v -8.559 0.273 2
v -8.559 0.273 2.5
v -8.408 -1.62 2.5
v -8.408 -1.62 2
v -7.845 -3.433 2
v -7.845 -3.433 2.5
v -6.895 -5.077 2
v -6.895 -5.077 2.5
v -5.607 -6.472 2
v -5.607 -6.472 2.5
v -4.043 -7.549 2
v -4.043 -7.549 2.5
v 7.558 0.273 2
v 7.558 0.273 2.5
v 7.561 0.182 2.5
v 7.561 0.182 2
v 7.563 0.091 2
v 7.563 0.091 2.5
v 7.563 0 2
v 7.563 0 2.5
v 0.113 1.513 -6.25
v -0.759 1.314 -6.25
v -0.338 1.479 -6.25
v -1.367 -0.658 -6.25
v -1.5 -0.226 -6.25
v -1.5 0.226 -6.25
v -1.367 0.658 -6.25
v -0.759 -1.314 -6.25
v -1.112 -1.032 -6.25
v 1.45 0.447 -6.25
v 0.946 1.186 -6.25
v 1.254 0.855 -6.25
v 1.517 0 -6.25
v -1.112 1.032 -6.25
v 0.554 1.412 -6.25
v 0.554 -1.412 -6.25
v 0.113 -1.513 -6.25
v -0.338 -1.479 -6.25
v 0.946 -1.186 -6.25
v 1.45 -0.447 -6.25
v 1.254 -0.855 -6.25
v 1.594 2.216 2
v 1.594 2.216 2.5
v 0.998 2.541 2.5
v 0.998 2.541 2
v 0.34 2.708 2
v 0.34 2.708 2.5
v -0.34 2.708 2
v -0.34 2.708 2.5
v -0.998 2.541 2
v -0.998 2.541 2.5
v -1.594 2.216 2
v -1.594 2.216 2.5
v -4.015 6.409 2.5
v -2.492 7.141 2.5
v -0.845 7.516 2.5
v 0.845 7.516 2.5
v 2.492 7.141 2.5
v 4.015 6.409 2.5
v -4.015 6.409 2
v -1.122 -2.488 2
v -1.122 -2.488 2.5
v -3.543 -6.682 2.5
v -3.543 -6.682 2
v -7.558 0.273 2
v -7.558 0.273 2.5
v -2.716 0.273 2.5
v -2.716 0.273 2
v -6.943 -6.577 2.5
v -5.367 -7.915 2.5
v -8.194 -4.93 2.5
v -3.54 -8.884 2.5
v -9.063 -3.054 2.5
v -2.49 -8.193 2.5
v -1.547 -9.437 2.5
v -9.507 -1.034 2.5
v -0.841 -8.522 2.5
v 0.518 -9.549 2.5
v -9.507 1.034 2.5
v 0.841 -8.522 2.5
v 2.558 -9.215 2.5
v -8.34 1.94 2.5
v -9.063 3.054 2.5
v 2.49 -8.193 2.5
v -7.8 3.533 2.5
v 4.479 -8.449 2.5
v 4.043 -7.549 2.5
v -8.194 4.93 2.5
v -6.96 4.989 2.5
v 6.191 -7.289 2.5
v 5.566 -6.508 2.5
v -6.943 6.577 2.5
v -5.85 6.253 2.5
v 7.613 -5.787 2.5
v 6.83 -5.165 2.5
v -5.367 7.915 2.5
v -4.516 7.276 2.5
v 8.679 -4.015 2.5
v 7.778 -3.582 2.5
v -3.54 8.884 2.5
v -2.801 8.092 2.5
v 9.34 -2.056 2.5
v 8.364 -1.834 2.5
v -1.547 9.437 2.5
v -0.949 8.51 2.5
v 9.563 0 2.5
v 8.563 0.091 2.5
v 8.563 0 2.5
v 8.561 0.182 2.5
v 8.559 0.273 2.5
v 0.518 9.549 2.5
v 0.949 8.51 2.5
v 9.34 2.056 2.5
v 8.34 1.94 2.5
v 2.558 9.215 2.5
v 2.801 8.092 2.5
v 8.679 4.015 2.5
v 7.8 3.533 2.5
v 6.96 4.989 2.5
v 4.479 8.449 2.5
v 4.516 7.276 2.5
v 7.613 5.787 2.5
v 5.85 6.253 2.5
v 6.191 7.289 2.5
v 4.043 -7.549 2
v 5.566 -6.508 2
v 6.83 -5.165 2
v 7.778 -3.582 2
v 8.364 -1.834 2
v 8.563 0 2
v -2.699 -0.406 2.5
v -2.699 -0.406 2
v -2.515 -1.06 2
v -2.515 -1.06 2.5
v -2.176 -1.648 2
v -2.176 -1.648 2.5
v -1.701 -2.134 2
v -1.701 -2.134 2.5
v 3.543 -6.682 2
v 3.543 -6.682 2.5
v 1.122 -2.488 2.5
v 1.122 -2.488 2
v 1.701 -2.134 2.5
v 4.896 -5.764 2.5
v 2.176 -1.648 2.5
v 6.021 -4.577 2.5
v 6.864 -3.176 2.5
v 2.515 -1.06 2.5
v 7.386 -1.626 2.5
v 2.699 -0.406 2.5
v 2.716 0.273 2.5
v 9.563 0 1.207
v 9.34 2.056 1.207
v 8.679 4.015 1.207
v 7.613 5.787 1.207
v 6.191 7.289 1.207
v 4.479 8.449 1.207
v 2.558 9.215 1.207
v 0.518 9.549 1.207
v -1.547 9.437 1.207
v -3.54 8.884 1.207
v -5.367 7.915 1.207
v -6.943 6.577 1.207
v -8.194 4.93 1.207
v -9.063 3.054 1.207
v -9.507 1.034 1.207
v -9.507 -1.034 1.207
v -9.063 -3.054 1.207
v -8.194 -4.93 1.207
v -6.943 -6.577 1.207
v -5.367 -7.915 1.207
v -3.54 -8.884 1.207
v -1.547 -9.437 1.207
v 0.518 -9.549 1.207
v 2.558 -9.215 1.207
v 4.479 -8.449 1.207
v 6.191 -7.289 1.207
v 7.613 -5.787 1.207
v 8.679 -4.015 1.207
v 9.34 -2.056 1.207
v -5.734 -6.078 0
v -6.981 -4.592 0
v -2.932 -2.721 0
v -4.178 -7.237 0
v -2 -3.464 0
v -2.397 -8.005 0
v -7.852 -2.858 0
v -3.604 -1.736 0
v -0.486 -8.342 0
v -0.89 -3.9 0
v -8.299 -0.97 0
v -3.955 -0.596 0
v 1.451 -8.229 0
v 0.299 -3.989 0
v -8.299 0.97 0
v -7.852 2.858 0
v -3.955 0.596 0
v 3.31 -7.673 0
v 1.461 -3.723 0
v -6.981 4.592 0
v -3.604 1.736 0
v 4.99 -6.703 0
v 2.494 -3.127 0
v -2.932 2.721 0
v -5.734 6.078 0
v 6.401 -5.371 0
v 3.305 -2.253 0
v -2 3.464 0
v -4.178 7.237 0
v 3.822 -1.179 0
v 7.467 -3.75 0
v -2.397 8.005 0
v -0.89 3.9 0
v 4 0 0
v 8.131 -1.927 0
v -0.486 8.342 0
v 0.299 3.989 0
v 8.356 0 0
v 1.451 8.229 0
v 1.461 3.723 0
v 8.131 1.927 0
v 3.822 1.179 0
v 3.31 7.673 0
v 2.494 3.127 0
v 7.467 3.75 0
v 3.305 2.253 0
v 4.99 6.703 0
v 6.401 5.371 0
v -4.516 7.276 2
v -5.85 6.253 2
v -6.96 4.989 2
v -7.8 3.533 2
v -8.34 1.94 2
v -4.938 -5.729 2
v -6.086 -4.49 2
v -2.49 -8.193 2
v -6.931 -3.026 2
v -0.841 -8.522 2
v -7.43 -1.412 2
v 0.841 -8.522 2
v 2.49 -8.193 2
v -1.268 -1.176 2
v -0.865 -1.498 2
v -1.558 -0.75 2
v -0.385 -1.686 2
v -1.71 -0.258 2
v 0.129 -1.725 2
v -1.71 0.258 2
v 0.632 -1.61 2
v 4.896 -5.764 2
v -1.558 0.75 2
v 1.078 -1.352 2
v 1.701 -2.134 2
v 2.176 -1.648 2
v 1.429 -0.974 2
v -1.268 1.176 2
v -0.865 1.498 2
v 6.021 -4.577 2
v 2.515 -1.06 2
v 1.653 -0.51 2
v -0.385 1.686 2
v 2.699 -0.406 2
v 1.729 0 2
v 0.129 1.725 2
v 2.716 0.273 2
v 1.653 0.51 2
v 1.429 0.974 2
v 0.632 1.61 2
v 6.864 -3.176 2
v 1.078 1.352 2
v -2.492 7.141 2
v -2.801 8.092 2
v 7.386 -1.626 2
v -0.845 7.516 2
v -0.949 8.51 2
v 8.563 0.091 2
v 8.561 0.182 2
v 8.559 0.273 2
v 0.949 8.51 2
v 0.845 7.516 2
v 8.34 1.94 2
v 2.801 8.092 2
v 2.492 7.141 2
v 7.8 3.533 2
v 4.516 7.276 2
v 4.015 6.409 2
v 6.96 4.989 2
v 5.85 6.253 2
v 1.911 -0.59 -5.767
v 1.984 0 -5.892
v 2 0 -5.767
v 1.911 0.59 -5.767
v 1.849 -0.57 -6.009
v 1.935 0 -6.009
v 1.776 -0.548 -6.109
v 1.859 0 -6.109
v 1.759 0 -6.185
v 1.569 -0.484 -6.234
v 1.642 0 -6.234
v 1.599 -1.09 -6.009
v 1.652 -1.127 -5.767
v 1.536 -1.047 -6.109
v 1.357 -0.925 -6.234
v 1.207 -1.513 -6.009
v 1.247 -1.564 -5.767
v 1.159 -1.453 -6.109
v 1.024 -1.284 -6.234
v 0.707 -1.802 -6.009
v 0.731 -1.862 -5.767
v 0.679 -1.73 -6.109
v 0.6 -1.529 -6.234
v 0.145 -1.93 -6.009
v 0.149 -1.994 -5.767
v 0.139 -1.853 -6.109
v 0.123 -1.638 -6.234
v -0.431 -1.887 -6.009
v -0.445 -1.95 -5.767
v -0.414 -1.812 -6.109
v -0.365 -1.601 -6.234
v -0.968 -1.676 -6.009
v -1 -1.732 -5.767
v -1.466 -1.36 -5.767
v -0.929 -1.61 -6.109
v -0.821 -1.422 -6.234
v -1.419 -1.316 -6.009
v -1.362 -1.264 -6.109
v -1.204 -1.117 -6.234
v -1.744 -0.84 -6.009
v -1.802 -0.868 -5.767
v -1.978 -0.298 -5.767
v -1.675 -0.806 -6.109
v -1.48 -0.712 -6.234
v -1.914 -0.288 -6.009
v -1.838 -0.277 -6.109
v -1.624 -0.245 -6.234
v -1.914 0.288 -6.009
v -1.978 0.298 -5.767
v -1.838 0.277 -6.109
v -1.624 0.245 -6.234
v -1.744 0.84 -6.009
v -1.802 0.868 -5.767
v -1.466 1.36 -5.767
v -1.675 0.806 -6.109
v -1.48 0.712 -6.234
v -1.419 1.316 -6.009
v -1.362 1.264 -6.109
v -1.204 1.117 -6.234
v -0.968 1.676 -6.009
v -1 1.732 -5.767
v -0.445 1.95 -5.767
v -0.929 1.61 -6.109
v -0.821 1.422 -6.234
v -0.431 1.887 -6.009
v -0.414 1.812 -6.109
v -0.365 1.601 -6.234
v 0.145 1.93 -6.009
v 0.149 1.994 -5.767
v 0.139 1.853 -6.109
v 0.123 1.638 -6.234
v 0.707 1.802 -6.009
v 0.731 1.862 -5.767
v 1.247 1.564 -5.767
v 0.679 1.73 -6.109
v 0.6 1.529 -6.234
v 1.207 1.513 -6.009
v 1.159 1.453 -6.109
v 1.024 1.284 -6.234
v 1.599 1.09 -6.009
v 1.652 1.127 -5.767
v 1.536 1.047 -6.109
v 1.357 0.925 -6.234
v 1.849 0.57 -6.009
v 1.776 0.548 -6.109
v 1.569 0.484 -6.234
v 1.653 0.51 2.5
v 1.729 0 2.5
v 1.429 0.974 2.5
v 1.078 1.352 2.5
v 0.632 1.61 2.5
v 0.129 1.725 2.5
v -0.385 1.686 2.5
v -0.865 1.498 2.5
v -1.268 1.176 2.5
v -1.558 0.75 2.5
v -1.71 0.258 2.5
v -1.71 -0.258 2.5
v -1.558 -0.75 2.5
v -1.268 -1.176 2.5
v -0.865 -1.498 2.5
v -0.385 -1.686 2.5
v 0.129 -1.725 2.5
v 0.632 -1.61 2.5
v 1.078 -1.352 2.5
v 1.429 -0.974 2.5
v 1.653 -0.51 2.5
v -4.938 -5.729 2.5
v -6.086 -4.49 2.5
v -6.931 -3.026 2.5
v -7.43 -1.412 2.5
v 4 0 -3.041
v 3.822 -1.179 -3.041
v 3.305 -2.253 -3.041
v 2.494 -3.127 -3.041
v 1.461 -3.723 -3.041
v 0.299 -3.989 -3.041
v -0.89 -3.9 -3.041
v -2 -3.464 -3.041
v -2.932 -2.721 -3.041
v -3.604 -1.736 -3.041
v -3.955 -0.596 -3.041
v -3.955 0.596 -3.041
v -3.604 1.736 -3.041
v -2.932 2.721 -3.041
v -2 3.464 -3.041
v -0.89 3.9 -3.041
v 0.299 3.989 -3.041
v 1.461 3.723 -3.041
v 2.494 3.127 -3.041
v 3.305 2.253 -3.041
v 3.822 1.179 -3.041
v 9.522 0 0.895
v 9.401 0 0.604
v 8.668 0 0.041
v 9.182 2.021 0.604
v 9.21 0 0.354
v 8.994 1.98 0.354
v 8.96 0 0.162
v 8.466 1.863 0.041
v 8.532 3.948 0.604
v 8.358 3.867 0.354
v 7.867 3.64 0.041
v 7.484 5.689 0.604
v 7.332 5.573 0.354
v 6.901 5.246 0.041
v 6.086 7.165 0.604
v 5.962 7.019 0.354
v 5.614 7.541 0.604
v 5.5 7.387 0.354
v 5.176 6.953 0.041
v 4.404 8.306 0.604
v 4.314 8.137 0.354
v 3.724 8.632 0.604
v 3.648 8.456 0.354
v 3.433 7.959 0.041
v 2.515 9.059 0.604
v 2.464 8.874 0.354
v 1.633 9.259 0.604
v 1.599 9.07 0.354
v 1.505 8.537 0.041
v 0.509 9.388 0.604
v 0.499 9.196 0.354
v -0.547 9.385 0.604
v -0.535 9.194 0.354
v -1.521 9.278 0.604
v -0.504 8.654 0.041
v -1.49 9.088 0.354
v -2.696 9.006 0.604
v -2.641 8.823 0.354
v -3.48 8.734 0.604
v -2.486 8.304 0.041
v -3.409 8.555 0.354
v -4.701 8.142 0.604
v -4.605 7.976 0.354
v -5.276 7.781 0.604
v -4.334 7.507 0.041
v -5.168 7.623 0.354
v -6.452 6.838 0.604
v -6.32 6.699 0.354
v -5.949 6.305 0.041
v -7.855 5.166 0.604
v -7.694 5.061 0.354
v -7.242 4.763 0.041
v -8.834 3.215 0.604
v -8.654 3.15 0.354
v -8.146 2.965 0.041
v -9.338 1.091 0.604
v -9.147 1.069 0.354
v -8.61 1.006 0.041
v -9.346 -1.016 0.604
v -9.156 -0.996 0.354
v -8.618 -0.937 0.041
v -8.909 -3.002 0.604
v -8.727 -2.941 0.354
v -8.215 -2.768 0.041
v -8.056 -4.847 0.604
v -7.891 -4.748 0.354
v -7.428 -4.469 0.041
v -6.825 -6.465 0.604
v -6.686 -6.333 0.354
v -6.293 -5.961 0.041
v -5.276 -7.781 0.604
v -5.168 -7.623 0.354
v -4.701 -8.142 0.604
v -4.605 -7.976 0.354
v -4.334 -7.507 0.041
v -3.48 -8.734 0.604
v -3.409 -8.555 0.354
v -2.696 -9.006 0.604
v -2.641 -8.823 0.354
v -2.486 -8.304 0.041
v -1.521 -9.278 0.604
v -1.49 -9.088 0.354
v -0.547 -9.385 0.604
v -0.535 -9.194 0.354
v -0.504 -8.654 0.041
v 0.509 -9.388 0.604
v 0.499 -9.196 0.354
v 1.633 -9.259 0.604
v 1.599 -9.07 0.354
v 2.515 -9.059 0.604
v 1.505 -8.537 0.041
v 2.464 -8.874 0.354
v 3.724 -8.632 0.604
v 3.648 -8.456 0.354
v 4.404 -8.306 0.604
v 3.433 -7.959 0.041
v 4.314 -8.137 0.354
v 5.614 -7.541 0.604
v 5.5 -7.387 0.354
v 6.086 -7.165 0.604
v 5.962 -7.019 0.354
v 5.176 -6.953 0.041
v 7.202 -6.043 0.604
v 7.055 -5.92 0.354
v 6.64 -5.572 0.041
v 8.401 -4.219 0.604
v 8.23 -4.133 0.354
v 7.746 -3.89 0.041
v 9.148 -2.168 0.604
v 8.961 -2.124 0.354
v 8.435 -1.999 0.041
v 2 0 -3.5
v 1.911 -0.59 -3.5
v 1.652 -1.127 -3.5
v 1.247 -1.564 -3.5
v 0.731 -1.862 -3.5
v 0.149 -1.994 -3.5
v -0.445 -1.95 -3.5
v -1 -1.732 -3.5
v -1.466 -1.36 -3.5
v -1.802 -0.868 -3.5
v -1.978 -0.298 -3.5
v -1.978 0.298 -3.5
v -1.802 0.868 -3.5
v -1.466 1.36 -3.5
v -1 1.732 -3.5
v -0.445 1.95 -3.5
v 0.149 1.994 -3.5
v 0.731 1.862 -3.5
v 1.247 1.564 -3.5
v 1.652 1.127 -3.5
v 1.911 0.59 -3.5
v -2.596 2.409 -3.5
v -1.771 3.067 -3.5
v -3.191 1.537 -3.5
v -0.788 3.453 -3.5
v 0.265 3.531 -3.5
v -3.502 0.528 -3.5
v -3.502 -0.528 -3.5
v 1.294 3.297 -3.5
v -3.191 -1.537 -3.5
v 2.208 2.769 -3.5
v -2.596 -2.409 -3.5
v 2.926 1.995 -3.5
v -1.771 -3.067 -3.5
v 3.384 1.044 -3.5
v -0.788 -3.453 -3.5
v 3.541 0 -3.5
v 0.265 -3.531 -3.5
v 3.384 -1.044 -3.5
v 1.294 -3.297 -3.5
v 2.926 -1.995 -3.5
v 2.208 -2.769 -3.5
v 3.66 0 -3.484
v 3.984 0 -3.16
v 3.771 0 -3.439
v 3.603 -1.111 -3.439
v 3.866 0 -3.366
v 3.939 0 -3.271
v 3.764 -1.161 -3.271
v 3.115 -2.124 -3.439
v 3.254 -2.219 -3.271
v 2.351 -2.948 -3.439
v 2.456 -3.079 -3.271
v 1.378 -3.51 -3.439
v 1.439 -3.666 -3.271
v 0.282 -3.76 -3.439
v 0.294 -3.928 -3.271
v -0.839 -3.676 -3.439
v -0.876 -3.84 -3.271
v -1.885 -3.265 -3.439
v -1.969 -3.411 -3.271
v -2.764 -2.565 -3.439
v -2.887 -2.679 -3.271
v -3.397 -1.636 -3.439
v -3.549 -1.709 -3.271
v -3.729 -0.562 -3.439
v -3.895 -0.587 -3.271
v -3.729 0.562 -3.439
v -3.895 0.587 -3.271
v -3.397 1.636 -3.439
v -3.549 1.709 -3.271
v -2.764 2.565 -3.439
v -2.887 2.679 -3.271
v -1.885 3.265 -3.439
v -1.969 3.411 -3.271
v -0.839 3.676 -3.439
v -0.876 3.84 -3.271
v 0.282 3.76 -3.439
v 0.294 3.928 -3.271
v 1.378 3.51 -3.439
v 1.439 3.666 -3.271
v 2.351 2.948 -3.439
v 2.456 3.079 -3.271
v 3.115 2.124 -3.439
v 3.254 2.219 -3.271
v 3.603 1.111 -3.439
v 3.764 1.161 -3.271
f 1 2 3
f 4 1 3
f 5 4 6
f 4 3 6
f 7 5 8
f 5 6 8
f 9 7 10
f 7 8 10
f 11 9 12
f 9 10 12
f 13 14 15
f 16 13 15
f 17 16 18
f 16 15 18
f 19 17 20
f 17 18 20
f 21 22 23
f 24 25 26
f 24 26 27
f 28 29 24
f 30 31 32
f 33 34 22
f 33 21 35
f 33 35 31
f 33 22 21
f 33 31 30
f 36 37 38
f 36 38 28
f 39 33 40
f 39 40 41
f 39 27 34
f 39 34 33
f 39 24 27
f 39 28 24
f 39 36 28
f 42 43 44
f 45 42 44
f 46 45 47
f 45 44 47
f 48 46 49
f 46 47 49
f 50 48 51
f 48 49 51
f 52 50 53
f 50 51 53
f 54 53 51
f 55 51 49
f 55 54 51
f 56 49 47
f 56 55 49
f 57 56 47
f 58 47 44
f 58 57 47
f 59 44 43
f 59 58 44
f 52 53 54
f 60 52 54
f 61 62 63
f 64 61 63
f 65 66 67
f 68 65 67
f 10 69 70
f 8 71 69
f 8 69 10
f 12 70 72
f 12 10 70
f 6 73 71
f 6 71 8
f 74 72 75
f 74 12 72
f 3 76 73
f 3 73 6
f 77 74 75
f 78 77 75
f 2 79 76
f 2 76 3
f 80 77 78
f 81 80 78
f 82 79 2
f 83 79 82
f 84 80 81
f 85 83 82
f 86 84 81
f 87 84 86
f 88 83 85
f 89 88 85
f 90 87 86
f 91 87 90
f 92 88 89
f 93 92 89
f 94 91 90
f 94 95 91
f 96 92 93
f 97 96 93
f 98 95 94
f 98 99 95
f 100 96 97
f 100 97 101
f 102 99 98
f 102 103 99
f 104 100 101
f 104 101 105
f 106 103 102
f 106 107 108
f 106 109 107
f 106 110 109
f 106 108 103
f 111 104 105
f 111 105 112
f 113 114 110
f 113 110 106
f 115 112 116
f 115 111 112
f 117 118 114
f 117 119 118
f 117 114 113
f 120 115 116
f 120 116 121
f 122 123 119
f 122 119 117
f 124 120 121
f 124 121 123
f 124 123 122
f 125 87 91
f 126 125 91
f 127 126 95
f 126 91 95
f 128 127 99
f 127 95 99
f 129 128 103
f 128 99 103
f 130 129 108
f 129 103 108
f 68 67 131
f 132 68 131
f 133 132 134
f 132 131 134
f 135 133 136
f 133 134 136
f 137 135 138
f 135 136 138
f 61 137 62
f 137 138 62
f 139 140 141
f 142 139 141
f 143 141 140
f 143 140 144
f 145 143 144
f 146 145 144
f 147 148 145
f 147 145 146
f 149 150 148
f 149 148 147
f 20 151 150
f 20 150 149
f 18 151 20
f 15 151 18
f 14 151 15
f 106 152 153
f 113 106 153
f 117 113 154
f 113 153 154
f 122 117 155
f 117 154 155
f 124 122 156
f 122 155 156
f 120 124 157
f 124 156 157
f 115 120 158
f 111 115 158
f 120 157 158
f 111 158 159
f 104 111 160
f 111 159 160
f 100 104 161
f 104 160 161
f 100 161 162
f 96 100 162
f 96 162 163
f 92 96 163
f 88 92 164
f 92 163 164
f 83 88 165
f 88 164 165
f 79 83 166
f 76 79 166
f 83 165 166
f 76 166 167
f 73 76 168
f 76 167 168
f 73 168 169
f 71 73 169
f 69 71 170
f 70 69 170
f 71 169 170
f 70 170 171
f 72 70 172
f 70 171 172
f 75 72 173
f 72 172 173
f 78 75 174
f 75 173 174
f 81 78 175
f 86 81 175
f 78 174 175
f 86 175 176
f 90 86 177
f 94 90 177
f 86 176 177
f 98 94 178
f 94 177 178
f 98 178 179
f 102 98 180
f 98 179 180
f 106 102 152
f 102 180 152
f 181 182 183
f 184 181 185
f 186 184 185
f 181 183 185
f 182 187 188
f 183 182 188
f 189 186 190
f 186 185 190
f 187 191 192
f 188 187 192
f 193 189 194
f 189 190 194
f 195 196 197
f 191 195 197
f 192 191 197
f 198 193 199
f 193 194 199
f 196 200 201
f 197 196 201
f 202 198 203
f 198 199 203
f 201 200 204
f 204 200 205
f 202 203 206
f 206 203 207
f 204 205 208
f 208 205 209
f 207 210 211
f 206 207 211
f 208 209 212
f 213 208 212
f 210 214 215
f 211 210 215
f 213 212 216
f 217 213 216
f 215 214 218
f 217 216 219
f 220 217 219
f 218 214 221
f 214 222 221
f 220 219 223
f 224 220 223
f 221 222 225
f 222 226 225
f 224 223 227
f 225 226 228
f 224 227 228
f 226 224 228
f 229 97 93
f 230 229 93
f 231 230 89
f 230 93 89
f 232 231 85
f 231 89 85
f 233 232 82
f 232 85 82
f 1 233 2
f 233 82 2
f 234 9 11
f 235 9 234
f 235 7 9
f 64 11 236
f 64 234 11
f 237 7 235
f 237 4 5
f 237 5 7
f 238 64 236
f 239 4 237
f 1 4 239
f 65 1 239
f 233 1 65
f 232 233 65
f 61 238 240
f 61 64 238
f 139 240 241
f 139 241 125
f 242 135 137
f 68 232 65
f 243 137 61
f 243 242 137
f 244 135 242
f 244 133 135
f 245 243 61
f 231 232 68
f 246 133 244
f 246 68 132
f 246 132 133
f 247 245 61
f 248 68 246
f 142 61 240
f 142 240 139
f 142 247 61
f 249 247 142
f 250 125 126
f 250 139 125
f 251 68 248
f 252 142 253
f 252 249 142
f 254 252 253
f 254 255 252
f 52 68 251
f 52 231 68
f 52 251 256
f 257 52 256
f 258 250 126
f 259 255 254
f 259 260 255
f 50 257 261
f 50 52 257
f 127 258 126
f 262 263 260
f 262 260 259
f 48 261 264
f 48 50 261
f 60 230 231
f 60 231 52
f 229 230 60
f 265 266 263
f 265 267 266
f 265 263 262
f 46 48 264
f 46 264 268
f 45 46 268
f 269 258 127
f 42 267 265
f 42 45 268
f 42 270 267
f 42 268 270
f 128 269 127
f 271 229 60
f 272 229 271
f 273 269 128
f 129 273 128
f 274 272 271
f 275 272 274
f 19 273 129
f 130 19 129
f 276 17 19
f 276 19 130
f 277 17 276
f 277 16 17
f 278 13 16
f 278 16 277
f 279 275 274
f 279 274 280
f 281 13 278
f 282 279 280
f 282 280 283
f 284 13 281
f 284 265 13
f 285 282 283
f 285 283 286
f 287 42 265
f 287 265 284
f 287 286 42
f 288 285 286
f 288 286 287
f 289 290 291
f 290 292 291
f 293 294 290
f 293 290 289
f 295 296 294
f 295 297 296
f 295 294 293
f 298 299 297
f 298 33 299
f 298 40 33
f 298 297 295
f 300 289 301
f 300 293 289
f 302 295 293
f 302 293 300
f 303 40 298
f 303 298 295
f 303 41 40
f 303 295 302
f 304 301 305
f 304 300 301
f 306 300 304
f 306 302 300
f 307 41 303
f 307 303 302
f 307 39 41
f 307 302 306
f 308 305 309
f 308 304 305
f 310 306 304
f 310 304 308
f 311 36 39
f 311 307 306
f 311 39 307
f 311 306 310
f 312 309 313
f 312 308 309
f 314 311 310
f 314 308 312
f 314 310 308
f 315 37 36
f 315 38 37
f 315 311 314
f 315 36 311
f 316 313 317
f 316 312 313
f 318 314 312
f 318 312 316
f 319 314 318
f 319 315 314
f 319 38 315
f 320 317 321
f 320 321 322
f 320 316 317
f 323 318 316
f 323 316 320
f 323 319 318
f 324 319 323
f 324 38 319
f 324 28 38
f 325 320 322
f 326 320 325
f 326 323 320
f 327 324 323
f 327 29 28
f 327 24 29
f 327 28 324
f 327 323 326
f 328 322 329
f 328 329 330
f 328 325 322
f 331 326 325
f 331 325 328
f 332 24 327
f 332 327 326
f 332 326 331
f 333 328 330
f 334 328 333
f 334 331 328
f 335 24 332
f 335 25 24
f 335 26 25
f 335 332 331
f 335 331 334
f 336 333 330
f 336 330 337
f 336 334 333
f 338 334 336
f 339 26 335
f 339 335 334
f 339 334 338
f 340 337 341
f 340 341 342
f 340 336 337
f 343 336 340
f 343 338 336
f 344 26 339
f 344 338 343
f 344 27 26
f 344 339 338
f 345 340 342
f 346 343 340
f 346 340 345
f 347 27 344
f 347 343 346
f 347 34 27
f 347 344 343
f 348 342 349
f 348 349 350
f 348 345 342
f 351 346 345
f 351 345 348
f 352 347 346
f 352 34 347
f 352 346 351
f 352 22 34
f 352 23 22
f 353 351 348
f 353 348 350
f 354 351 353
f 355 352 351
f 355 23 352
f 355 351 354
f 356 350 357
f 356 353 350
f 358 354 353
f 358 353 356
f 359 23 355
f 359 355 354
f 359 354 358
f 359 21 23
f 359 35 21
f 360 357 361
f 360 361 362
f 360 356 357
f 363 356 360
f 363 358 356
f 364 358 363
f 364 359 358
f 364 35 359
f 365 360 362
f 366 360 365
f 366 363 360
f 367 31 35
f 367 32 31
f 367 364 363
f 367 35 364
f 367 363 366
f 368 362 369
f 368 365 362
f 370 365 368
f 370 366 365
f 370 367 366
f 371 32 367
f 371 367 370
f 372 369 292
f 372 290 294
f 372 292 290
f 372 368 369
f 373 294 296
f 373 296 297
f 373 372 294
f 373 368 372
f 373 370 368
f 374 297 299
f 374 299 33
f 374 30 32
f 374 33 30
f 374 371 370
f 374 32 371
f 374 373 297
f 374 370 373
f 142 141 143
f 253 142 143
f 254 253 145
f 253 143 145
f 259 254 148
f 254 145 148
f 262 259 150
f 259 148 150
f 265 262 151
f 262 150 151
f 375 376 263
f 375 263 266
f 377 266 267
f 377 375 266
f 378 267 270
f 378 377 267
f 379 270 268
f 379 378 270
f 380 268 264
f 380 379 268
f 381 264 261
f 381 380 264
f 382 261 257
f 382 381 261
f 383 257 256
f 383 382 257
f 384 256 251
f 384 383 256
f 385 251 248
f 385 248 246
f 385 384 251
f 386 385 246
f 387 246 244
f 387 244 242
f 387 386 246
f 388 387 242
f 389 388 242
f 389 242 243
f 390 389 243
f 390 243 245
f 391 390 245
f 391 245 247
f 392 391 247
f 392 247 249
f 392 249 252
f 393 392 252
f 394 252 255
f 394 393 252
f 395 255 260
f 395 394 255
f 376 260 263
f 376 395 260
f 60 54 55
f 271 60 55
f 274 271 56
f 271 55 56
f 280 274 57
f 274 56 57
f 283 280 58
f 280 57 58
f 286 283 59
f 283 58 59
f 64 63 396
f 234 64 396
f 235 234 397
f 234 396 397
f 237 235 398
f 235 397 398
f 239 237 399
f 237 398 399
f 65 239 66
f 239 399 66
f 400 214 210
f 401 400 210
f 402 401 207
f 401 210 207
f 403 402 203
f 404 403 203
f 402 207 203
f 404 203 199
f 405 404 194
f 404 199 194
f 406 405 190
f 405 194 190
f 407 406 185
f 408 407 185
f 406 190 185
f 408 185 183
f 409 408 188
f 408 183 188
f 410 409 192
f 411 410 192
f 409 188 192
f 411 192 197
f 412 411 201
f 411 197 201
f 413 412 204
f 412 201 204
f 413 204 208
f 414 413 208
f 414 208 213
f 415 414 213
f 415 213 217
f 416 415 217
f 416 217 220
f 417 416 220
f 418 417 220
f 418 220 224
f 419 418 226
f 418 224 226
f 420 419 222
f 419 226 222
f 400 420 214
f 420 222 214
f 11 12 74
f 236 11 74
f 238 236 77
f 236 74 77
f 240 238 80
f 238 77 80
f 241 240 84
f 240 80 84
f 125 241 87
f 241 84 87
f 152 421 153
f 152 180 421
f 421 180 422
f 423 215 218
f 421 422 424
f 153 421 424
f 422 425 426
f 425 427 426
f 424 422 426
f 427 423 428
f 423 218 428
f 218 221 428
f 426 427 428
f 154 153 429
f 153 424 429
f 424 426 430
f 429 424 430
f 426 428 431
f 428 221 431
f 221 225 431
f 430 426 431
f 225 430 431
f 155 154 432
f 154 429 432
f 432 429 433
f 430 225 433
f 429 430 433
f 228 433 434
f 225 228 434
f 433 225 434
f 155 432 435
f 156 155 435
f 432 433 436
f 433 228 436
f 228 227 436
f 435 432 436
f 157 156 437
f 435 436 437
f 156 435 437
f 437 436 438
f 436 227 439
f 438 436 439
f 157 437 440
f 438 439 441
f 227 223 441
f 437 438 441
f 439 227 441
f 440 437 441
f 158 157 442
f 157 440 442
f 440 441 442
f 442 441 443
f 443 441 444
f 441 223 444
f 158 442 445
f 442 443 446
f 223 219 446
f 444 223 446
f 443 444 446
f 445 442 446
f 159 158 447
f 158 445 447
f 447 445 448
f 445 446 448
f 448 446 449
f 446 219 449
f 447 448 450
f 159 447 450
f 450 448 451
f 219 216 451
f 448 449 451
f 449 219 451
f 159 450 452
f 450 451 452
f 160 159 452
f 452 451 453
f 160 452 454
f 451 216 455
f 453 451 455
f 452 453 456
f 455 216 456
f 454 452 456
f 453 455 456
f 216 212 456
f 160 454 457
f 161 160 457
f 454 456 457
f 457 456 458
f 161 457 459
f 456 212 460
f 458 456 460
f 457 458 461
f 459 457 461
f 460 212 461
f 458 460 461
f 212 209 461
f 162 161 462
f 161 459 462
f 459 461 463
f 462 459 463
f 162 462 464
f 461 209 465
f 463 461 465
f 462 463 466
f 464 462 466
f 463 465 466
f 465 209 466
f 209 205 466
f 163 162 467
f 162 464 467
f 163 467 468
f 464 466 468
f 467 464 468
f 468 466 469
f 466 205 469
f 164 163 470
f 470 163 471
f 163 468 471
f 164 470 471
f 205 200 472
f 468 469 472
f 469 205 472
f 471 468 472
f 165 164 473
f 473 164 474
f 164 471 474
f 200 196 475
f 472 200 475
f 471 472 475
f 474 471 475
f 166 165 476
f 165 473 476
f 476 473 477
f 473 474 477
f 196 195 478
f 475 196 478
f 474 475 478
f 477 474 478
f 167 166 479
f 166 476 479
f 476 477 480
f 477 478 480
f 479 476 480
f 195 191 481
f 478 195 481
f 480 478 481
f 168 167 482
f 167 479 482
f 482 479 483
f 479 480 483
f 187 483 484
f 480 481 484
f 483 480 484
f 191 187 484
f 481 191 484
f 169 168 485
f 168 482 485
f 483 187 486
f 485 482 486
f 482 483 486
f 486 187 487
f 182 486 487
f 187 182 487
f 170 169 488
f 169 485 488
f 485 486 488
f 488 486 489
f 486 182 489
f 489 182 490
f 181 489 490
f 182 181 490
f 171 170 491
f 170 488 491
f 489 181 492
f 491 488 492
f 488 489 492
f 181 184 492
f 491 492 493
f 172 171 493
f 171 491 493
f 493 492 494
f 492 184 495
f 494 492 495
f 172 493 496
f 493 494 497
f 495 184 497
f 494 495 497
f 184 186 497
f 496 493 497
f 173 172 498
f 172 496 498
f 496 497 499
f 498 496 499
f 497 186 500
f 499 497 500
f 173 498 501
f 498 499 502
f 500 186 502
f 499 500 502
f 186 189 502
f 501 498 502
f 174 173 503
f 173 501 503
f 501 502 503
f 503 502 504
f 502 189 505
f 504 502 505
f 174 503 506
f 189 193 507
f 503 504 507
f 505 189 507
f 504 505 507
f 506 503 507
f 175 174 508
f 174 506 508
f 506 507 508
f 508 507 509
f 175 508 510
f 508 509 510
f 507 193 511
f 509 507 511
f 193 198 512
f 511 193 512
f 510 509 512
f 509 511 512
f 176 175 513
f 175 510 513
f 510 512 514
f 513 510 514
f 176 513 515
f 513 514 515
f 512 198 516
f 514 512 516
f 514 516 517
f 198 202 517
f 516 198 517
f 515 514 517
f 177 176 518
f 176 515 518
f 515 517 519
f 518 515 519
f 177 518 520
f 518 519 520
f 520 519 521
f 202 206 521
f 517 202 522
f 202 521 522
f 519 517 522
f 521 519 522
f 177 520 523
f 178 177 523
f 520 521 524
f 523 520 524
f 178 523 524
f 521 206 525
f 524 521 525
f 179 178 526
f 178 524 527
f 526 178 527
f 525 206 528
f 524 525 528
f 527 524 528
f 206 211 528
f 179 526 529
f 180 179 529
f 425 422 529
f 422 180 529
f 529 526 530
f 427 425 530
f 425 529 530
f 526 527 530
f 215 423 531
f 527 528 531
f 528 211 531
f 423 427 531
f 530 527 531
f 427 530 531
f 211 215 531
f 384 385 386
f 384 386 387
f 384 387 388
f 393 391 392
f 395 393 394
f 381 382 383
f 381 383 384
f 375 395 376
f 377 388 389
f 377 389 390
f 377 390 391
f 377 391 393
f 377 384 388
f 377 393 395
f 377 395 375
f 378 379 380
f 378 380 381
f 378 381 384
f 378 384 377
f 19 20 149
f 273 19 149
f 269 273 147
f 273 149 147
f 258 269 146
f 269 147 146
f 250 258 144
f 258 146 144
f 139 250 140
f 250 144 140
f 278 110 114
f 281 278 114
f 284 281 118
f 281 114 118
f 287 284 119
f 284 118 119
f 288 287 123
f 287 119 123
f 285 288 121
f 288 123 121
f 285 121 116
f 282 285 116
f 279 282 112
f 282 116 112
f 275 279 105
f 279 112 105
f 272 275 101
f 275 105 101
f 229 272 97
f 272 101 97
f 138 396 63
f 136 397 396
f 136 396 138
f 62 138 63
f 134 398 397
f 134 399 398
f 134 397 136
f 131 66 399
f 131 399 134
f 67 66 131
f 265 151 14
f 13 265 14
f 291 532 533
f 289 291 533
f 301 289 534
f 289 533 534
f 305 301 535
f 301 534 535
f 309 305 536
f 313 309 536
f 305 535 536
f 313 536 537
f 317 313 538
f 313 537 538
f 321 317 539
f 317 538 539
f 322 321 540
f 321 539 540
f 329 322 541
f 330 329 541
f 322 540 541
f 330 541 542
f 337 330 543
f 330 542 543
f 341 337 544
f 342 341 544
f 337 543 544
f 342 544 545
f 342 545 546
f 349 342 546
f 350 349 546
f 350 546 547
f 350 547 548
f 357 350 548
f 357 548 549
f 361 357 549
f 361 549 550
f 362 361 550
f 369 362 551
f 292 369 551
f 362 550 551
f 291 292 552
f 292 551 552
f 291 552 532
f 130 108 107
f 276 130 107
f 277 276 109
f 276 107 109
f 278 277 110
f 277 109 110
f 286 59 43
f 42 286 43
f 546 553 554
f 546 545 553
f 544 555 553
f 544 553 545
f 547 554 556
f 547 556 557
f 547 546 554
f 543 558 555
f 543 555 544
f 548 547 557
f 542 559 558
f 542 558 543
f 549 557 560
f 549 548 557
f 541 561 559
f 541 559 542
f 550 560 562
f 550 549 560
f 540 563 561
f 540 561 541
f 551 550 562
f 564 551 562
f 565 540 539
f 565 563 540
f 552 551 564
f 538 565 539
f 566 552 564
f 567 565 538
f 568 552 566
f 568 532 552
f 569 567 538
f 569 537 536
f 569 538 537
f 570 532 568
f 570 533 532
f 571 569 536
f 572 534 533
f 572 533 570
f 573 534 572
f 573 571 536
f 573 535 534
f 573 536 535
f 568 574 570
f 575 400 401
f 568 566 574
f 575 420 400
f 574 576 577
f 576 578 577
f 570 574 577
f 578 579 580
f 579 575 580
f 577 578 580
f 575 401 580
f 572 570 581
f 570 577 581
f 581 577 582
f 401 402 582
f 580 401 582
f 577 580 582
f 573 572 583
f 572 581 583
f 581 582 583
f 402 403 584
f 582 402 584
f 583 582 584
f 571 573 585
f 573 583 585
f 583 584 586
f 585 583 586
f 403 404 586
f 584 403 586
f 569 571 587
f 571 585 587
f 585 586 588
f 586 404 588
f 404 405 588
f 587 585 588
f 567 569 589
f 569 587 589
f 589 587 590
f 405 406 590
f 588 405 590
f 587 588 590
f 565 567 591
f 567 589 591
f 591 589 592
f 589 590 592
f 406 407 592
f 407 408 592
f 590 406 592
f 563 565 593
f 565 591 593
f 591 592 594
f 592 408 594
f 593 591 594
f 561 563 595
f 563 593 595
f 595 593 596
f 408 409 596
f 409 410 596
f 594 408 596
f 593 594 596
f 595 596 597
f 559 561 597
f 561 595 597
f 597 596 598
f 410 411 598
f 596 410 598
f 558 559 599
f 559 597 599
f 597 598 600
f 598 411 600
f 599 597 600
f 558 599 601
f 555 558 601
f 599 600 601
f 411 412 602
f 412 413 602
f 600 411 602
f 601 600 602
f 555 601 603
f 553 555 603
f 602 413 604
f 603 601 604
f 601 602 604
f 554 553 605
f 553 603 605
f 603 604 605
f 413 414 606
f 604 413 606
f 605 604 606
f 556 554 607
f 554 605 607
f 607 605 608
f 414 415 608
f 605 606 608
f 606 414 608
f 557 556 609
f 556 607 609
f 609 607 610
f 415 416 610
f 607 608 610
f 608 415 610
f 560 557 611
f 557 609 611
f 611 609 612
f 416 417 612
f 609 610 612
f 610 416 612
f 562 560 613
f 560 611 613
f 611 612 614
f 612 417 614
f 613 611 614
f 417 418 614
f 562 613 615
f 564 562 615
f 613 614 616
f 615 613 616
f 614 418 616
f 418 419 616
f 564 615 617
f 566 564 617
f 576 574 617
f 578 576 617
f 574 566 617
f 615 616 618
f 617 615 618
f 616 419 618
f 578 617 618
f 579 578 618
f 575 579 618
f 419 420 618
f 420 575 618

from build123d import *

# Parameters (mm, degrees)
F0_R     = 9.5631
F1_DEPTH = 2.5
F2_R     = 1.729466
F3_DEPTH = 0.5
F4_R     = 4
F5_DEPTH = 3.5
F6_R     = 1.207107
F7_R     = 2
F8_DEPTH = 2.75
F9_R     = 0.482843
F10_R    = 0.458701


with BuildPart() as f1:
    # F0 (on Top) → F1 (new body)
    with BuildSketch(Plane.XY):
        Circle(F0_R)
    extrude(amount=F1_DEPTH)

    # F2 (on face) → F3 (cut)
    with BuildSketch(Plane.XY.offset(2.5)):
        with BuildLine():
            ThreePointArc((-7.558177, 0.272846), (-6.549837, 3.78155), (-4.01538, 6.40915))
            Line((-4.01538, 6.40915), (-4.515668, 7.275673))
            ThreePointArc((-4.515668, 7.275673), (-7.415862, 4.28155), (-8.558752, 0.272846))
            Line((-8.558752, 0.272846), (-7.558177, 0.272846))
        make_face()
        with BuildLine():
            ThreePointArc((-4.01538, 6.40915), (0, 7.5631), (4.01538, 6.40915))
            Line((4.01538, 6.40915), (4.515668, 7.275673))
            ThreePointArc((4.515668, 7.275673), (0, 8.5631), (-4.515668, 7.275673))
            Line((-4.515668, 7.275673), (-4.01538, 6.40915))
        make_face()
        with BuildLine():
            Line((4.515668, 7.275673), (4.01538, 6.40915))
            ThreePointArc((4.01538, 6.40915), (6.549837, 3.78155), (7.558177, 0.272846))
            Line((7.558177, 0.272846), (8.558752, 0.272846))
            ThreePointArc((8.558752, 0.272846), (7.415862, 4.28155), (4.515668, 7.275673))
        make_face()
        with BuildLine():
            Line((8.558752, 0.272846), (7.558177, 0.272846))
            ThreePointArc((7.558177, 0.272846), (7.561869, 0.136445), (7.5631, 0))
            ThreePointArc((7.5631, 0), (6.480548, -3.8991), (3.542796, -6.681996))
            Line((3.542796, -6.681996), (4.043084, -7.54852))
            ThreePointArc((4.043084, -7.54852), (7.3467, -4.399167), (8.5631, 0))
            ThreePointArc((8.5631, 0), (8.562013, 0.136441), (8.558752, 0.272846))
        make_face()
        with BuildLine():
            ThreePointArc((3.542796, -6.681996), (0, -7.5631), (-3.542796, -6.681996))
            Line((-3.542796, -6.681996), (-4.043084, -7.54852))
            ThreePointArc((-4.043084, -7.54852), (0, -8.5631), (4.043084, -7.54852))
            Line((4.043084, -7.54852), (3.542796, -6.681996))
        make_face()
        with BuildLine():
            ThreePointArc((-3.542796, -6.681996), (-6.549837, -3.78155), (-7.558177, 0.272846))
            Line((-7.558177, 0.272846), (-8.558752, 0.272846))
            ThreePointArc((-8.558752, 0.272846), (-7.415862, -4.28155), (-4.043084, -7.54852))
            Line((-4.043084, -7.54852), (-3.542796, -6.681996))
        make_face()
        with BuildLine():
            Line((4.01538, 6.40915), (1.594189, 2.215524))
            ThreePointArc((1.594189, 2.215524), (0, 2.729466), (-1.594189, 2.215524))
            Line((-1.594189, 2.215524), (-4.01538, 6.40915))
            ThreePointArc((-4.01538, 6.40915), (-6.549837, 3.78155), (-7.558177, 0.272846))
            Line((-7.558177, 0.272846), (-2.715795, 0.272846))
            ThreePointArc((-2.715795, 0.272846), (-2.363787, -1.364733), (-1.121605, -2.48837))
            Line((-1.121605, -2.48837), (-3.542796, -6.681996))
            ThreePointArc((-3.542796, -6.681996), (0, -7.5631), (3.542796, -6.681996))
            Line((3.542796, -6.681996), (1.121605, -2.48837))
            ThreePointArc((1.121605, -2.48837), (2.363787, -1.364733), (2.715795, 0.272846))
            Line((2.715795, 0.272846), (7.558177, 0.272846))
            ThreePointArc((7.558177, 0.272846), (6.549837, 3.78155), (4.01538, 6.40915))
        make_face()
        Circle(F2_R, mode=Mode.SUBTRACT)
    extrude(amount=-F3_DEPTH, mode=Mode.SUBTRACT)

    # F4 (on face) → F5 (join)
    with BuildSketch(Plane(origin=(0, 0, 0), x_dir=(1, 0, 0), z_dir=(0, 0, -1))):
        Circle(F4_R)
    extrude(amount=F5_DEPTH)

    # F6
    f6_edges = [f1.edges().sort_by_distance(p)[0] for p in [
        (-9.5631, 0, 0),
    ]]
    fillet(f6_edges, radius=F6_R)

    # F7 (on face) → F8 (join)
    with BuildSketch(Plane(origin=(0, 0, -3.5), x_dir=(1, 0, 0), z_dir=(0, 0, -1))):
        Circle(F7_R)
    extrude(amount=F8_DEPTH)

    # F9
    f9_edges = [f1.edges().sort_by_distance(p)[0] for p in [
        (-2, 0, -6.25),
    ]]
    fillet(f9_edges, radius=F9_R)

    # F10
    f10_edges = [f1.edges().sort_by_distance(p)[0] for p in [
        (-4, 0, -3.5),
    ]]
    fillet(f10_edges, radius=F10_R)


solid = f1.part
